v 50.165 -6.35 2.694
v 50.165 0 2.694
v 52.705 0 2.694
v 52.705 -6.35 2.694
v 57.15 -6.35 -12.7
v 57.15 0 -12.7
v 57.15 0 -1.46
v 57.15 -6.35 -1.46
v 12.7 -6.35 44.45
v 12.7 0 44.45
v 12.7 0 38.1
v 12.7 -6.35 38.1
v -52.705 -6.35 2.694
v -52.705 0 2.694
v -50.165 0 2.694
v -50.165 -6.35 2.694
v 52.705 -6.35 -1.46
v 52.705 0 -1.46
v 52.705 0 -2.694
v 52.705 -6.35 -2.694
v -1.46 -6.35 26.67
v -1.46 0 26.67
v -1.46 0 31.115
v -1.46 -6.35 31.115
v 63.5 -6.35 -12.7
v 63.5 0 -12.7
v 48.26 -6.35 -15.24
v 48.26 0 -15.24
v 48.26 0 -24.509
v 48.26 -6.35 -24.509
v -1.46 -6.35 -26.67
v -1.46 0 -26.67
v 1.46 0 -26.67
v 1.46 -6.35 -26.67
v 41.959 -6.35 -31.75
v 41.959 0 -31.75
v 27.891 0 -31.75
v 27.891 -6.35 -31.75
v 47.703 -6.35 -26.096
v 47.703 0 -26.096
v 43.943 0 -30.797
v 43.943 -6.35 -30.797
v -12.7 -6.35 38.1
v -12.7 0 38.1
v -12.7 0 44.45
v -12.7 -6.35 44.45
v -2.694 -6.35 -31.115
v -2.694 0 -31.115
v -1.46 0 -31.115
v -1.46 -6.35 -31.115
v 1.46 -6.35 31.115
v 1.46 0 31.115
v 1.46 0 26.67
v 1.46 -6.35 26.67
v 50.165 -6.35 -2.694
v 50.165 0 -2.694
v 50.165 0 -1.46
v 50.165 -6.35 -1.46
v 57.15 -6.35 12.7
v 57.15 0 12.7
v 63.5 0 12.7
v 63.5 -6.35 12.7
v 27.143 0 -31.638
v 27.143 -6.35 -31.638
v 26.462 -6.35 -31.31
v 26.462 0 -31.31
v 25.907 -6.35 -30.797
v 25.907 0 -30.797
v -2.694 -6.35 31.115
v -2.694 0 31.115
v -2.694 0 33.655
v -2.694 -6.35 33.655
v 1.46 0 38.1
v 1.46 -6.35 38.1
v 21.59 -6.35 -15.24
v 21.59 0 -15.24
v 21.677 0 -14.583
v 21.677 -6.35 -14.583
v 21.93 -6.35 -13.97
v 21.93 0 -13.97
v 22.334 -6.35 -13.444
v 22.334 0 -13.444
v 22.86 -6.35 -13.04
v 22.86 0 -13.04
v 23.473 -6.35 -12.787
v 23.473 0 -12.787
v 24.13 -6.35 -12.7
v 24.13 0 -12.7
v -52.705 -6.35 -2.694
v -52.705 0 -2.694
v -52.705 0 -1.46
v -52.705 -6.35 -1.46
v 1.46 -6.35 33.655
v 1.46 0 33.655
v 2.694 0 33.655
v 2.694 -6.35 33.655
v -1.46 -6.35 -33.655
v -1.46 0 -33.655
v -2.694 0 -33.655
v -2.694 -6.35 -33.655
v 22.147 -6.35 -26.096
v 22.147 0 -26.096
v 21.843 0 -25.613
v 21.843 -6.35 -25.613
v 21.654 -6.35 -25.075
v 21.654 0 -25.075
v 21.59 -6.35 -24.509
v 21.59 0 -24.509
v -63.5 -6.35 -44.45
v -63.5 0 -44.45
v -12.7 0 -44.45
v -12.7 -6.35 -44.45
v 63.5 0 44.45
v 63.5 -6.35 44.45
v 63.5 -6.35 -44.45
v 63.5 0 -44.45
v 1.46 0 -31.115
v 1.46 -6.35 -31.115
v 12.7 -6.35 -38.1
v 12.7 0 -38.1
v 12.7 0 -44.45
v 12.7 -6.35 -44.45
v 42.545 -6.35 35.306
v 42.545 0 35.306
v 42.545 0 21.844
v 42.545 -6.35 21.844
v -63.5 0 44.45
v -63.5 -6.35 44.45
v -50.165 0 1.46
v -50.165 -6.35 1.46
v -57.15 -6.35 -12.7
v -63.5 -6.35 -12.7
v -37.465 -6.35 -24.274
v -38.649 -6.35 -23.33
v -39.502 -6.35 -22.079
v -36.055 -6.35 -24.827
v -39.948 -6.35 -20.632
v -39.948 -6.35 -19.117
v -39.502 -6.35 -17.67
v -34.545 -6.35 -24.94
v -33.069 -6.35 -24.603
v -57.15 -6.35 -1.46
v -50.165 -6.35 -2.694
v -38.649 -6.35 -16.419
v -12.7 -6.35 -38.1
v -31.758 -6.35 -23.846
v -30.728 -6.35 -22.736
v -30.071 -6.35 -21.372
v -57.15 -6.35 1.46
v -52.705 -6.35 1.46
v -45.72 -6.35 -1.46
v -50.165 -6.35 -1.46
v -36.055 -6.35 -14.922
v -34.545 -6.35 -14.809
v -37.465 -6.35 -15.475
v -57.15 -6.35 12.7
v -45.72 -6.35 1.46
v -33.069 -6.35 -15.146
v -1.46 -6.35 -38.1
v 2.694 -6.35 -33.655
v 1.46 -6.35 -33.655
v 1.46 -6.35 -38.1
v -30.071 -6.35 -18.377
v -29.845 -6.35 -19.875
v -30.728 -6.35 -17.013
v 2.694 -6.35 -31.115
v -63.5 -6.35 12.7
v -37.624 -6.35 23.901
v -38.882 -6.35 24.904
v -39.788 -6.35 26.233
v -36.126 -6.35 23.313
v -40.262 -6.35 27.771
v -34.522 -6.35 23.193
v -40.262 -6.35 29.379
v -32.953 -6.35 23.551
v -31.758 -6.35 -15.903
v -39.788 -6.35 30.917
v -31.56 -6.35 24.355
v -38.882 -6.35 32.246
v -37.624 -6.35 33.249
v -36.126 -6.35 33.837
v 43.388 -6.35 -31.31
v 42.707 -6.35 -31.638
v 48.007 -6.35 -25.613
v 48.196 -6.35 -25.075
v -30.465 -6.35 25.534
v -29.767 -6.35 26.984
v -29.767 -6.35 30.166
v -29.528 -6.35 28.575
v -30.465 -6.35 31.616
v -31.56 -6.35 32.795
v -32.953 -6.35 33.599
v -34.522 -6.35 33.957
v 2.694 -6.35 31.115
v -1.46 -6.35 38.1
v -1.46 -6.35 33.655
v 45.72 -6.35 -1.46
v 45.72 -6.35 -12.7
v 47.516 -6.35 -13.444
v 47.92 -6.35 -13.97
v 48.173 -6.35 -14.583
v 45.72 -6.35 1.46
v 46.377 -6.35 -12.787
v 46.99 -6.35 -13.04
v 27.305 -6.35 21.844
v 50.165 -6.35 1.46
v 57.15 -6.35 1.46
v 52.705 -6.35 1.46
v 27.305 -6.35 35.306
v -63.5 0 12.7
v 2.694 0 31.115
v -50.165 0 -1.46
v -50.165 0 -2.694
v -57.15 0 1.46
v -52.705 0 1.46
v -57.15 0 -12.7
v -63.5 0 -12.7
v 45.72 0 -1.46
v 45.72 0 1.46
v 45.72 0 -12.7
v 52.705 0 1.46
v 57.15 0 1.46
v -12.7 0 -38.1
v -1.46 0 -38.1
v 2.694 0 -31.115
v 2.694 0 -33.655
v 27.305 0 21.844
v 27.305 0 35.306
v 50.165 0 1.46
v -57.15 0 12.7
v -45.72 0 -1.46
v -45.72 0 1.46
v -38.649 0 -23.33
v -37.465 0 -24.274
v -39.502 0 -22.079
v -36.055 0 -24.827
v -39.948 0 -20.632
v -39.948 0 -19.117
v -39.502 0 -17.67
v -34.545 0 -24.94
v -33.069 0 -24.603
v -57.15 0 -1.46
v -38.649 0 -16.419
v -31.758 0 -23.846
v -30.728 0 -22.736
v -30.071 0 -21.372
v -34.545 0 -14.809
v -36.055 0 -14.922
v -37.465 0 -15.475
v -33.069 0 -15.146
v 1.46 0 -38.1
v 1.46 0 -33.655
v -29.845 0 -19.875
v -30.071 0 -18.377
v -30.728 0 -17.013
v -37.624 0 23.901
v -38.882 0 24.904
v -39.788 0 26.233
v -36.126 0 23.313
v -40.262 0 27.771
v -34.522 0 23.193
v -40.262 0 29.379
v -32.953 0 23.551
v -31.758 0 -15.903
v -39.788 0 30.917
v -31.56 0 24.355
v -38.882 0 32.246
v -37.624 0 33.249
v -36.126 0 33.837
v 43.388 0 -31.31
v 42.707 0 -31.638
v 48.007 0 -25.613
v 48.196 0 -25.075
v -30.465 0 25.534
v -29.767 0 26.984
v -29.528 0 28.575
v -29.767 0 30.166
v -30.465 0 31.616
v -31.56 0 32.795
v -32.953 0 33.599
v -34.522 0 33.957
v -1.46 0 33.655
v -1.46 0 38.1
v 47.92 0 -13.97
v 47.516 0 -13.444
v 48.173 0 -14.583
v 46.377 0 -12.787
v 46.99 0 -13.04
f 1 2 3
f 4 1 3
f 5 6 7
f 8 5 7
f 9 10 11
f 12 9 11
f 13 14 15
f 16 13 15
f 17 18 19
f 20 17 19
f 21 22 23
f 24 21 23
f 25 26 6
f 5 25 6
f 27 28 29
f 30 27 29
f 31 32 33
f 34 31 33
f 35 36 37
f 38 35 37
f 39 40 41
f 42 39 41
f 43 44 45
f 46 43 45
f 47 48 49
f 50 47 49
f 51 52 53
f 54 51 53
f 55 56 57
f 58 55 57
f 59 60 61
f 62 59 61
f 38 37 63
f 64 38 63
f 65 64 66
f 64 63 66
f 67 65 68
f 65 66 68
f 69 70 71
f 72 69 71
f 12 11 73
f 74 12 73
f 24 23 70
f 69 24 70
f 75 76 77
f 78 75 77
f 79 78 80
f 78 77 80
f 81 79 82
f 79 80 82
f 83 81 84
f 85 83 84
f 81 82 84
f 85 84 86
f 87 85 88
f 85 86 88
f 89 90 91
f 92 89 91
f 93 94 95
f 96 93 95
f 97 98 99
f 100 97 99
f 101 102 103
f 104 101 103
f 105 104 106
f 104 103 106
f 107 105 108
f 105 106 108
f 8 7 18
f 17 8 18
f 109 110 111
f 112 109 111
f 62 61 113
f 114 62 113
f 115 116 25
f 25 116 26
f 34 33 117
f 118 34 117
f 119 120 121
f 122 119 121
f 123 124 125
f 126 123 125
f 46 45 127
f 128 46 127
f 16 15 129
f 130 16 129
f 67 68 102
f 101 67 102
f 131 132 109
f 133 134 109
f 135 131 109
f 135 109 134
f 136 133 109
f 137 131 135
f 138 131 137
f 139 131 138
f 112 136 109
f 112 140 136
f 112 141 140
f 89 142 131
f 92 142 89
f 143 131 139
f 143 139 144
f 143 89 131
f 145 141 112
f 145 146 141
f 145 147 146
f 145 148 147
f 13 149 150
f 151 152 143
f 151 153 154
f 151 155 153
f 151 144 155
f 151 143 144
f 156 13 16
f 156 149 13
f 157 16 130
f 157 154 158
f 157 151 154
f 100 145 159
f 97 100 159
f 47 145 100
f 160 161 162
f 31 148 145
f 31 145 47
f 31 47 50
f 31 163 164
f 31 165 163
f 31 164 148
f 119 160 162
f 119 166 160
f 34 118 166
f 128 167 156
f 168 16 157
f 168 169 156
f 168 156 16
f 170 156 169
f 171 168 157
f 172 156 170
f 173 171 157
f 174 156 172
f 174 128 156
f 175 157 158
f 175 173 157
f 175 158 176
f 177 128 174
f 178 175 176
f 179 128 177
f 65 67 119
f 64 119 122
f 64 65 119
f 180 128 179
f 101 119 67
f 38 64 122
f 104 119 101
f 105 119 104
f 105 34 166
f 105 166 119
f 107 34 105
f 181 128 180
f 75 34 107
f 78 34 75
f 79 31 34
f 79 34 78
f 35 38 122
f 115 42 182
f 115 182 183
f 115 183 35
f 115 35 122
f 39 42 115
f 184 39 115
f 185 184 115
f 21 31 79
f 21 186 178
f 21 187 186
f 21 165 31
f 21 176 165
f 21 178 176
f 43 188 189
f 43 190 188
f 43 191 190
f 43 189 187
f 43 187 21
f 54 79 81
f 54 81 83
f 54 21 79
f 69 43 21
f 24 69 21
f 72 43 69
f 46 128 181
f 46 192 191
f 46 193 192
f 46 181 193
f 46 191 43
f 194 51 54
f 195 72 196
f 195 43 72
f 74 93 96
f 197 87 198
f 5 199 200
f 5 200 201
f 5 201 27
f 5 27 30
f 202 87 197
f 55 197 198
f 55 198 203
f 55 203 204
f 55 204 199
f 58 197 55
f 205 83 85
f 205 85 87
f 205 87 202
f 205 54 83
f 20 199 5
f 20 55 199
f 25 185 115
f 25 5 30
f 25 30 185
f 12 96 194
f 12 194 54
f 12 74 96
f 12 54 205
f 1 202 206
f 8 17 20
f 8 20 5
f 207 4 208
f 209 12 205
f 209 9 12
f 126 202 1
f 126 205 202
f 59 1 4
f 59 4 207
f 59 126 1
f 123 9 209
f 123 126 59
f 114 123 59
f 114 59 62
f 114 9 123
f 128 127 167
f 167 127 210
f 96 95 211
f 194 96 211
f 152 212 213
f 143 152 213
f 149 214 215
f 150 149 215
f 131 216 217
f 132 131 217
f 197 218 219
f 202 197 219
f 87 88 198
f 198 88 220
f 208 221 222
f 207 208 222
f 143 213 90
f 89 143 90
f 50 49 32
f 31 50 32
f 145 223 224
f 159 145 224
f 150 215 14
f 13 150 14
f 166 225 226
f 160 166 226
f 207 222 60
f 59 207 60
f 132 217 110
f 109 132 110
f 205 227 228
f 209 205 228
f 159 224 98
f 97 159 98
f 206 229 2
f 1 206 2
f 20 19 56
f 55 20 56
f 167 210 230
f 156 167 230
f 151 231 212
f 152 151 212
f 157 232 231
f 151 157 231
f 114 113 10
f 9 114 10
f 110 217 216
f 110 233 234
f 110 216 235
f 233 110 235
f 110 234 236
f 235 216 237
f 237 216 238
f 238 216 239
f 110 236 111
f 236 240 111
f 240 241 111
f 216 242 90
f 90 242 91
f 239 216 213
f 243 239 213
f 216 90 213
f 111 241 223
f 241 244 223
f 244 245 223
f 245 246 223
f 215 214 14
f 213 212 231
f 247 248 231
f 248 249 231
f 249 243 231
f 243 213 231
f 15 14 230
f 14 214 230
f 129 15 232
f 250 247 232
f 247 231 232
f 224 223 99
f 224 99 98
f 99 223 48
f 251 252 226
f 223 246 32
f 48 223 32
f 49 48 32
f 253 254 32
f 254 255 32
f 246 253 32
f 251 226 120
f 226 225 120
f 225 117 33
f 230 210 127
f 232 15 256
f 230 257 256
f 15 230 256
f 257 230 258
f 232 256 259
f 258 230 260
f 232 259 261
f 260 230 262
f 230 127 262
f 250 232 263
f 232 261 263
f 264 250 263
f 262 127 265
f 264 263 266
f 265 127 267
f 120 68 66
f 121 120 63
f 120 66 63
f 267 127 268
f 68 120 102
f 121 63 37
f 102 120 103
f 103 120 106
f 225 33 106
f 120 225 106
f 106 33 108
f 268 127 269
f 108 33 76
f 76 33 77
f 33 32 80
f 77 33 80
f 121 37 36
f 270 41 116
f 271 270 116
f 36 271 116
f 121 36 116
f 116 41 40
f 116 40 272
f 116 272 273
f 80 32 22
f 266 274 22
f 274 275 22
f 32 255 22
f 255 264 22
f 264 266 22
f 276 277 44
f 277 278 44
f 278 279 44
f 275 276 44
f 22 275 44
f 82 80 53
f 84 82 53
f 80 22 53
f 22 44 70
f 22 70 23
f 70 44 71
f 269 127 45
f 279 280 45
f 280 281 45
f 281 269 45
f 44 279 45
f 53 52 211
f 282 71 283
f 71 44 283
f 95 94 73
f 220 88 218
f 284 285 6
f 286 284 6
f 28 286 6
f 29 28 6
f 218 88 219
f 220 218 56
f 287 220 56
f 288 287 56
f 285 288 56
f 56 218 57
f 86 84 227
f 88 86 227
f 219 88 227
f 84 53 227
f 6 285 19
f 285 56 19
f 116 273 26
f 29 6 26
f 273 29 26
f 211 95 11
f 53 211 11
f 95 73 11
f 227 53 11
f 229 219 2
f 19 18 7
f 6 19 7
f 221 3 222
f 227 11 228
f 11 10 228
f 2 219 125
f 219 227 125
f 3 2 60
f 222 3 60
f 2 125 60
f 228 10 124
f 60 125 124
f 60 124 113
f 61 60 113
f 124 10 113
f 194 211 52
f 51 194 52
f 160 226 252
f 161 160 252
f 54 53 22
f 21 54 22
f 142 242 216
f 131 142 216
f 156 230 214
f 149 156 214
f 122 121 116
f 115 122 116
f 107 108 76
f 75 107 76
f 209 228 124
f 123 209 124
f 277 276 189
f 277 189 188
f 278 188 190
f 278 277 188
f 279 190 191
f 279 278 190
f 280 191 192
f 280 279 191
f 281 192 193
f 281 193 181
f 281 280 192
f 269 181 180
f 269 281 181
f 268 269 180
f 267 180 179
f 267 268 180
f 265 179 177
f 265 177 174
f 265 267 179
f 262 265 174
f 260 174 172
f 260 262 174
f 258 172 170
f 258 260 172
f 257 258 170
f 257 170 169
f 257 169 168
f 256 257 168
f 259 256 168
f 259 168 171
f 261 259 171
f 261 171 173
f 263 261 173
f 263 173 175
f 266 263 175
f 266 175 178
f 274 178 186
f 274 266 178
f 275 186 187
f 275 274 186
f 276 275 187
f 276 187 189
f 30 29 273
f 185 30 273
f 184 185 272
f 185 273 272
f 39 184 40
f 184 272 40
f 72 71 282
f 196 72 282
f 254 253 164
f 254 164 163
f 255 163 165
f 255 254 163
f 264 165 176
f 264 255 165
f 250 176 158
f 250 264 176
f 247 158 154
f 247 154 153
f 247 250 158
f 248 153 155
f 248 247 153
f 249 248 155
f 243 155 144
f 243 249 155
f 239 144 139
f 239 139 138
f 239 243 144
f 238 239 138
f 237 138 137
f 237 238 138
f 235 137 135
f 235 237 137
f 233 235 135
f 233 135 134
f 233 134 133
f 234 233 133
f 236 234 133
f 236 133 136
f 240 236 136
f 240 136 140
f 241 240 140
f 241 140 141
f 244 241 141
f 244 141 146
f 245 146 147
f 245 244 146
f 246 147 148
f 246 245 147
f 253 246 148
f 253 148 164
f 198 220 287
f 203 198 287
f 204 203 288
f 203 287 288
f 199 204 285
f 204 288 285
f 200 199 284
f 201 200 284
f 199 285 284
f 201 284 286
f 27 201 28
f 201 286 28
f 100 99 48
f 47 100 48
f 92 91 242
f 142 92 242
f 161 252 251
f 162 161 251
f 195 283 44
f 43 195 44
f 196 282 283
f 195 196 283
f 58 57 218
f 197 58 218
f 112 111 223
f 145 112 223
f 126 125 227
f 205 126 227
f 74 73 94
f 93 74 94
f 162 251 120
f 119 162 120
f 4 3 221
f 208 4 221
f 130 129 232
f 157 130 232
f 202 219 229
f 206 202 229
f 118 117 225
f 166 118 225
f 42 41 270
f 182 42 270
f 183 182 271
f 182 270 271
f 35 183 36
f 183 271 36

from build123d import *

# Parameters (mm, degrees)
F0_R     = 5.08
F0_R_2   = 5.3975
F1_DEPTH = 6.35


# Not quite as in the source:
# - a feature names something its author has since deleted; it is built from what else it names


with BuildPart() as f1:
    # F0 (on Front) → F1 (new body)
    with BuildSketch(Plane.XZ):
        with BuildLine():
            Line((34.9250002354, -44.45), (57.1500004709, -44.45))
            Line((57.1500004709, -44.45), (63.5, -44.45))
            Line((63.5, -44.45), (63.5, -12.7))
            Line((63.5, -12.7), (57.1500004709, -12.7))
            Line((57.1500004709, -12.7), (57.1500004709, -1.4605))
            Line((57.1500004709, -1.4605), (52.7050002354, -1.4605))
            Line((52.7050002354, -1.4605), (52.7050002354, -2.69367))
            Line((52.7050002354, -2.69367), (50.1650002354, -2.69367))
            Line((50.1650002354, -2.69367), (50.1650002354, -1.4605))
            Line((50.1650002354, -1.4605), (45.72, -1.4605))
            Line((45.72, -1.4605), (45.72, 1.4605))
            Line((45.72, 1.4605), (50.1650002354, 1.4605))
            Line((50.1650002354, 1.4605), (50.1650002354, 2.69367))
            Line((50.1650002354, 2.69367), (52.7050002354, 2.69367))
            Line((52.7050002354, 2.69367), (52.7050002354, 1.4605))
            Line((52.7050002354, 1.4605), (57.1500004709, 1.4605))
            Line((57.1500004709, 1.4605), (57.1500004709, 12.7))
            Line((57.1500004709, 12.7), (63.5, 12.7))
            Line((63.5, 12.7), (63.5, 44.45))
            Line((63.5, 44.45), (57.1500004709, 44.45))
            Line((57.1500004709, 44.45), (34.9250002354, 44.45))
            Line((34.9250002354, 44.45), (34.9250002354, 35.306))
            Line((34.9250002354, 35.306), (42.5450002354, 35.306))
            Line((42.5450002354, 35.306), (42.5450002354, 21.844))
            Line((42.5450002354, 21.844), (34.9250002354, 21.844))
            Line((34.9250002354, 21.844), (34.9250002354, -12.7))
            Line((34.9250002354, -12.7), (45.7200002354, -12.7))
            ThreePointArc((45.7200002354, -12.7), (47.5160514597, -13.4439487758), (48.2600002354, -15.24))
            Line((48.2600002354, -15.24), (48.2600002354, -24.5090161092))
            ThreePointArc((48.2600002354, -24.5090161092), (48.1168161661, -25.3497737405), (47.7034070114, -26.09574153))
            Line((47.7034070114, -26.09574153), (43.9426198988, -30.7967254208))
            ThreePointArc((43.9426198988, -30.7967254208), (43.0595124983, -31.4993102202), (41.9592131228, -31.75))
            Line((41.9592131228, -31.75), (34.9250002354, -31.75))
            Line((34.9250002354, -31.75), (34.9250002354, -44.45))
        make_face()
        with BuildLine():
            Line((12.7, -44.45), (34.9250002354, -44.45))
            Line((34.9250002354, -44.45), (34.9250002354, -31.75))
            Line((34.9250002354, -31.75), (27.8907873481, -31.75))
            ThreePointArc((27.8907873481, -31.75), (26.7904879726, -31.4993102202), (25.9073805721, -30.7967254208))
            Line((25.9073805721, -30.7967254208), (22.1465934595, -26.09574153))
            ThreePointArc((22.1465934595, -26.09574153), (21.7331843048, -25.3497737405), (21.5900002354, -24.5090161092))
            Line((21.5900002354, -24.5090161092), (21.5900002354, -15.24))
            ThreePointArc((21.5900002354, -15.24), (22.3339490112, -13.4439487758), (24.1300002354, -12.7))
            Line((24.1300002354, -12.7), (34.9250002354, -12.7))
            Line((34.9250002354, -12.7), (34.9250002354, 21.844))
            Line((34.9250002354, 21.844), (27.3050002354, 21.844))
            Line((27.3050002354, 21.844), (27.3050002354, 35.306))
            Line((27.3050002354, 35.306), (34.9250002354, 35.306))
            Line((34.9250002354, 35.306), (34.9250002354, 44.45))
            Line((34.9250002354, 44.45), (12.7, 44.45))
            Line((12.7, 44.45), (12.7, 38.1000004709))
            Line((12.7, 38.1000004709), (1.4605, 38.1000004709))
            Line((1.4605, 38.1000004709), (1.4605, 33.6550002354))
            Line((1.4605, 33.6550002354), (2.69367, 33.6550002354))
            Line((2.69367, 33.6550002354), (2.69367, 31.1150002354))
            Line((2.69367, 31.1150002354), (1.4605, 31.1150002354))
            Line((1.4605, 31.1150002354), (1.4605, 26.67))
            Line((1.4605, 26.67), (-1.4605, 26.67))
            Line((-1.4605, 26.67), (-1.4605, 31.1150002354))
            Line((-1.4605, 31.1150002354), (-2.69367, 31.1150002354))
            Line((-2.69367, 31.1150002354), (-2.69367, 33.6550002354))
            Line((-2.69367, 33.6550002354), (-1.4605, 33.6550002354))
            Line((-1.4605, 33.6550002354), (-1.4605, 38.1000004709))
            Line((-1.4605, 38.1000004709), (-12.7, 38.1000004709))
            Line((-12.7, 38.1000004709), (-12.7, 44.45))
            Line((-12.7, 44.45), (-57.1500004709, 44.45))
            Line((-57.1500004709, 44.45), (-63.5, 44.45))
            Line((-63.5, 44.45), (-63.5, 12.7))
            Line((-63.5, 12.7), (-57.1500004709, 12.7))
            Line((-57.1500004709, 12.7), (-57.1500004709, 1.4605))
            Line((-57.1500004709, 1.4605), (-52.7050002354, 1.4605))
            Line((-52.7050002354, 1.4605), (-52.7050002354, 2.69367))
            Line((-52.7050002354, 2.69367), (-50.1650002354, 2.69367))
            Line((-50.1650002354, 2.69367), (-50.1650002354, 1.4605))
            Line((-50.1650002354, 1.4605), (-45.72, 1.4605))
            Line((-45.72, 1.4605), (-45.72, -1.4605))
            Line((-45.72, -1.4605), (-50.1650002354, -1.4605))
            Line((-50.1650002354, -1.4605), (-50.1650002354, -2.69367))
            Line((-50.1650002354, -2.69367), (-52.7050002354, -2.69367))
            Line((-52.7050002354, -2.69367), (-52.7050002354, -1.4605))
            Line((-52.7050002354, -1.4605), (-57.1500004709, -1.4605))
            Line((-57.1500004709, -1.4605), (-57.1500004709, -2.69367))
            Line((-57.1500004709, -2.69367), (-57.1500004709, -12.7))
            Line((-57.1500004709, -12.7), (-63.5, -12.7))
            Line((-63.5, -12.7), (-63.5, -44.45))
            Line((-63.5, -44.45), (-57.1500004709, -44.45))
            Line((-57.1500004709, -44.45), (-12.7, -44.45))
            Line((-12.7, -44.45), (-12.7, -38.1000004709))
            Line((-12.7, -38.1000004709), (-1.4605, -38.1000004709))
            Line((-1.4605, -38.1000004709), (-1.4605, -33.6550002354))
            Line((-1.4605, -33.6550002354), (-2.69367, -33.6550002354))
            Line((-2.69367, -33.6550002354), (-2.69367, -31.1150002354))
            Line((-2.69367, -31.1150002354), (-1.4605, -31.1150002354))
            Line((-1.4605, -31.1150002354), (-1.4605, -26.67))
            Line((-1.4605, -26.67), (1.4605, -26.67))
            Line((1.4605, -26.67), (1.4605, -31.1150002354))
            Line((1.4605, -31.1150002354), (2.69367, -31.1150002354))
            Line((2.69367, -31.1150002354), (2.69367, -33.6550002354))
            Line((2.69367, -33.6550002354), (1.4605, -33.6550002354))
            Line((1.4605, -33.6550002354), (1.4605, -38.1000004709))
            Line((1.4605, -38.1000004709), (12.7, -38.1000004709))
            Line((12.7, -38.1000004709), (12.7, -44.45))
        make_face()
        with Locations((-34.9250002354, -19.8745080546)):
            Circle(F0_R, mode=Mode.SUBTRACT)
        with Locations((-34.9250002354, 28.575)):
            Circle(F0_R_2, mode=Mode.SUBTRACT)
    extrude(amount=F1_DEPTH)


solid = f1.part
